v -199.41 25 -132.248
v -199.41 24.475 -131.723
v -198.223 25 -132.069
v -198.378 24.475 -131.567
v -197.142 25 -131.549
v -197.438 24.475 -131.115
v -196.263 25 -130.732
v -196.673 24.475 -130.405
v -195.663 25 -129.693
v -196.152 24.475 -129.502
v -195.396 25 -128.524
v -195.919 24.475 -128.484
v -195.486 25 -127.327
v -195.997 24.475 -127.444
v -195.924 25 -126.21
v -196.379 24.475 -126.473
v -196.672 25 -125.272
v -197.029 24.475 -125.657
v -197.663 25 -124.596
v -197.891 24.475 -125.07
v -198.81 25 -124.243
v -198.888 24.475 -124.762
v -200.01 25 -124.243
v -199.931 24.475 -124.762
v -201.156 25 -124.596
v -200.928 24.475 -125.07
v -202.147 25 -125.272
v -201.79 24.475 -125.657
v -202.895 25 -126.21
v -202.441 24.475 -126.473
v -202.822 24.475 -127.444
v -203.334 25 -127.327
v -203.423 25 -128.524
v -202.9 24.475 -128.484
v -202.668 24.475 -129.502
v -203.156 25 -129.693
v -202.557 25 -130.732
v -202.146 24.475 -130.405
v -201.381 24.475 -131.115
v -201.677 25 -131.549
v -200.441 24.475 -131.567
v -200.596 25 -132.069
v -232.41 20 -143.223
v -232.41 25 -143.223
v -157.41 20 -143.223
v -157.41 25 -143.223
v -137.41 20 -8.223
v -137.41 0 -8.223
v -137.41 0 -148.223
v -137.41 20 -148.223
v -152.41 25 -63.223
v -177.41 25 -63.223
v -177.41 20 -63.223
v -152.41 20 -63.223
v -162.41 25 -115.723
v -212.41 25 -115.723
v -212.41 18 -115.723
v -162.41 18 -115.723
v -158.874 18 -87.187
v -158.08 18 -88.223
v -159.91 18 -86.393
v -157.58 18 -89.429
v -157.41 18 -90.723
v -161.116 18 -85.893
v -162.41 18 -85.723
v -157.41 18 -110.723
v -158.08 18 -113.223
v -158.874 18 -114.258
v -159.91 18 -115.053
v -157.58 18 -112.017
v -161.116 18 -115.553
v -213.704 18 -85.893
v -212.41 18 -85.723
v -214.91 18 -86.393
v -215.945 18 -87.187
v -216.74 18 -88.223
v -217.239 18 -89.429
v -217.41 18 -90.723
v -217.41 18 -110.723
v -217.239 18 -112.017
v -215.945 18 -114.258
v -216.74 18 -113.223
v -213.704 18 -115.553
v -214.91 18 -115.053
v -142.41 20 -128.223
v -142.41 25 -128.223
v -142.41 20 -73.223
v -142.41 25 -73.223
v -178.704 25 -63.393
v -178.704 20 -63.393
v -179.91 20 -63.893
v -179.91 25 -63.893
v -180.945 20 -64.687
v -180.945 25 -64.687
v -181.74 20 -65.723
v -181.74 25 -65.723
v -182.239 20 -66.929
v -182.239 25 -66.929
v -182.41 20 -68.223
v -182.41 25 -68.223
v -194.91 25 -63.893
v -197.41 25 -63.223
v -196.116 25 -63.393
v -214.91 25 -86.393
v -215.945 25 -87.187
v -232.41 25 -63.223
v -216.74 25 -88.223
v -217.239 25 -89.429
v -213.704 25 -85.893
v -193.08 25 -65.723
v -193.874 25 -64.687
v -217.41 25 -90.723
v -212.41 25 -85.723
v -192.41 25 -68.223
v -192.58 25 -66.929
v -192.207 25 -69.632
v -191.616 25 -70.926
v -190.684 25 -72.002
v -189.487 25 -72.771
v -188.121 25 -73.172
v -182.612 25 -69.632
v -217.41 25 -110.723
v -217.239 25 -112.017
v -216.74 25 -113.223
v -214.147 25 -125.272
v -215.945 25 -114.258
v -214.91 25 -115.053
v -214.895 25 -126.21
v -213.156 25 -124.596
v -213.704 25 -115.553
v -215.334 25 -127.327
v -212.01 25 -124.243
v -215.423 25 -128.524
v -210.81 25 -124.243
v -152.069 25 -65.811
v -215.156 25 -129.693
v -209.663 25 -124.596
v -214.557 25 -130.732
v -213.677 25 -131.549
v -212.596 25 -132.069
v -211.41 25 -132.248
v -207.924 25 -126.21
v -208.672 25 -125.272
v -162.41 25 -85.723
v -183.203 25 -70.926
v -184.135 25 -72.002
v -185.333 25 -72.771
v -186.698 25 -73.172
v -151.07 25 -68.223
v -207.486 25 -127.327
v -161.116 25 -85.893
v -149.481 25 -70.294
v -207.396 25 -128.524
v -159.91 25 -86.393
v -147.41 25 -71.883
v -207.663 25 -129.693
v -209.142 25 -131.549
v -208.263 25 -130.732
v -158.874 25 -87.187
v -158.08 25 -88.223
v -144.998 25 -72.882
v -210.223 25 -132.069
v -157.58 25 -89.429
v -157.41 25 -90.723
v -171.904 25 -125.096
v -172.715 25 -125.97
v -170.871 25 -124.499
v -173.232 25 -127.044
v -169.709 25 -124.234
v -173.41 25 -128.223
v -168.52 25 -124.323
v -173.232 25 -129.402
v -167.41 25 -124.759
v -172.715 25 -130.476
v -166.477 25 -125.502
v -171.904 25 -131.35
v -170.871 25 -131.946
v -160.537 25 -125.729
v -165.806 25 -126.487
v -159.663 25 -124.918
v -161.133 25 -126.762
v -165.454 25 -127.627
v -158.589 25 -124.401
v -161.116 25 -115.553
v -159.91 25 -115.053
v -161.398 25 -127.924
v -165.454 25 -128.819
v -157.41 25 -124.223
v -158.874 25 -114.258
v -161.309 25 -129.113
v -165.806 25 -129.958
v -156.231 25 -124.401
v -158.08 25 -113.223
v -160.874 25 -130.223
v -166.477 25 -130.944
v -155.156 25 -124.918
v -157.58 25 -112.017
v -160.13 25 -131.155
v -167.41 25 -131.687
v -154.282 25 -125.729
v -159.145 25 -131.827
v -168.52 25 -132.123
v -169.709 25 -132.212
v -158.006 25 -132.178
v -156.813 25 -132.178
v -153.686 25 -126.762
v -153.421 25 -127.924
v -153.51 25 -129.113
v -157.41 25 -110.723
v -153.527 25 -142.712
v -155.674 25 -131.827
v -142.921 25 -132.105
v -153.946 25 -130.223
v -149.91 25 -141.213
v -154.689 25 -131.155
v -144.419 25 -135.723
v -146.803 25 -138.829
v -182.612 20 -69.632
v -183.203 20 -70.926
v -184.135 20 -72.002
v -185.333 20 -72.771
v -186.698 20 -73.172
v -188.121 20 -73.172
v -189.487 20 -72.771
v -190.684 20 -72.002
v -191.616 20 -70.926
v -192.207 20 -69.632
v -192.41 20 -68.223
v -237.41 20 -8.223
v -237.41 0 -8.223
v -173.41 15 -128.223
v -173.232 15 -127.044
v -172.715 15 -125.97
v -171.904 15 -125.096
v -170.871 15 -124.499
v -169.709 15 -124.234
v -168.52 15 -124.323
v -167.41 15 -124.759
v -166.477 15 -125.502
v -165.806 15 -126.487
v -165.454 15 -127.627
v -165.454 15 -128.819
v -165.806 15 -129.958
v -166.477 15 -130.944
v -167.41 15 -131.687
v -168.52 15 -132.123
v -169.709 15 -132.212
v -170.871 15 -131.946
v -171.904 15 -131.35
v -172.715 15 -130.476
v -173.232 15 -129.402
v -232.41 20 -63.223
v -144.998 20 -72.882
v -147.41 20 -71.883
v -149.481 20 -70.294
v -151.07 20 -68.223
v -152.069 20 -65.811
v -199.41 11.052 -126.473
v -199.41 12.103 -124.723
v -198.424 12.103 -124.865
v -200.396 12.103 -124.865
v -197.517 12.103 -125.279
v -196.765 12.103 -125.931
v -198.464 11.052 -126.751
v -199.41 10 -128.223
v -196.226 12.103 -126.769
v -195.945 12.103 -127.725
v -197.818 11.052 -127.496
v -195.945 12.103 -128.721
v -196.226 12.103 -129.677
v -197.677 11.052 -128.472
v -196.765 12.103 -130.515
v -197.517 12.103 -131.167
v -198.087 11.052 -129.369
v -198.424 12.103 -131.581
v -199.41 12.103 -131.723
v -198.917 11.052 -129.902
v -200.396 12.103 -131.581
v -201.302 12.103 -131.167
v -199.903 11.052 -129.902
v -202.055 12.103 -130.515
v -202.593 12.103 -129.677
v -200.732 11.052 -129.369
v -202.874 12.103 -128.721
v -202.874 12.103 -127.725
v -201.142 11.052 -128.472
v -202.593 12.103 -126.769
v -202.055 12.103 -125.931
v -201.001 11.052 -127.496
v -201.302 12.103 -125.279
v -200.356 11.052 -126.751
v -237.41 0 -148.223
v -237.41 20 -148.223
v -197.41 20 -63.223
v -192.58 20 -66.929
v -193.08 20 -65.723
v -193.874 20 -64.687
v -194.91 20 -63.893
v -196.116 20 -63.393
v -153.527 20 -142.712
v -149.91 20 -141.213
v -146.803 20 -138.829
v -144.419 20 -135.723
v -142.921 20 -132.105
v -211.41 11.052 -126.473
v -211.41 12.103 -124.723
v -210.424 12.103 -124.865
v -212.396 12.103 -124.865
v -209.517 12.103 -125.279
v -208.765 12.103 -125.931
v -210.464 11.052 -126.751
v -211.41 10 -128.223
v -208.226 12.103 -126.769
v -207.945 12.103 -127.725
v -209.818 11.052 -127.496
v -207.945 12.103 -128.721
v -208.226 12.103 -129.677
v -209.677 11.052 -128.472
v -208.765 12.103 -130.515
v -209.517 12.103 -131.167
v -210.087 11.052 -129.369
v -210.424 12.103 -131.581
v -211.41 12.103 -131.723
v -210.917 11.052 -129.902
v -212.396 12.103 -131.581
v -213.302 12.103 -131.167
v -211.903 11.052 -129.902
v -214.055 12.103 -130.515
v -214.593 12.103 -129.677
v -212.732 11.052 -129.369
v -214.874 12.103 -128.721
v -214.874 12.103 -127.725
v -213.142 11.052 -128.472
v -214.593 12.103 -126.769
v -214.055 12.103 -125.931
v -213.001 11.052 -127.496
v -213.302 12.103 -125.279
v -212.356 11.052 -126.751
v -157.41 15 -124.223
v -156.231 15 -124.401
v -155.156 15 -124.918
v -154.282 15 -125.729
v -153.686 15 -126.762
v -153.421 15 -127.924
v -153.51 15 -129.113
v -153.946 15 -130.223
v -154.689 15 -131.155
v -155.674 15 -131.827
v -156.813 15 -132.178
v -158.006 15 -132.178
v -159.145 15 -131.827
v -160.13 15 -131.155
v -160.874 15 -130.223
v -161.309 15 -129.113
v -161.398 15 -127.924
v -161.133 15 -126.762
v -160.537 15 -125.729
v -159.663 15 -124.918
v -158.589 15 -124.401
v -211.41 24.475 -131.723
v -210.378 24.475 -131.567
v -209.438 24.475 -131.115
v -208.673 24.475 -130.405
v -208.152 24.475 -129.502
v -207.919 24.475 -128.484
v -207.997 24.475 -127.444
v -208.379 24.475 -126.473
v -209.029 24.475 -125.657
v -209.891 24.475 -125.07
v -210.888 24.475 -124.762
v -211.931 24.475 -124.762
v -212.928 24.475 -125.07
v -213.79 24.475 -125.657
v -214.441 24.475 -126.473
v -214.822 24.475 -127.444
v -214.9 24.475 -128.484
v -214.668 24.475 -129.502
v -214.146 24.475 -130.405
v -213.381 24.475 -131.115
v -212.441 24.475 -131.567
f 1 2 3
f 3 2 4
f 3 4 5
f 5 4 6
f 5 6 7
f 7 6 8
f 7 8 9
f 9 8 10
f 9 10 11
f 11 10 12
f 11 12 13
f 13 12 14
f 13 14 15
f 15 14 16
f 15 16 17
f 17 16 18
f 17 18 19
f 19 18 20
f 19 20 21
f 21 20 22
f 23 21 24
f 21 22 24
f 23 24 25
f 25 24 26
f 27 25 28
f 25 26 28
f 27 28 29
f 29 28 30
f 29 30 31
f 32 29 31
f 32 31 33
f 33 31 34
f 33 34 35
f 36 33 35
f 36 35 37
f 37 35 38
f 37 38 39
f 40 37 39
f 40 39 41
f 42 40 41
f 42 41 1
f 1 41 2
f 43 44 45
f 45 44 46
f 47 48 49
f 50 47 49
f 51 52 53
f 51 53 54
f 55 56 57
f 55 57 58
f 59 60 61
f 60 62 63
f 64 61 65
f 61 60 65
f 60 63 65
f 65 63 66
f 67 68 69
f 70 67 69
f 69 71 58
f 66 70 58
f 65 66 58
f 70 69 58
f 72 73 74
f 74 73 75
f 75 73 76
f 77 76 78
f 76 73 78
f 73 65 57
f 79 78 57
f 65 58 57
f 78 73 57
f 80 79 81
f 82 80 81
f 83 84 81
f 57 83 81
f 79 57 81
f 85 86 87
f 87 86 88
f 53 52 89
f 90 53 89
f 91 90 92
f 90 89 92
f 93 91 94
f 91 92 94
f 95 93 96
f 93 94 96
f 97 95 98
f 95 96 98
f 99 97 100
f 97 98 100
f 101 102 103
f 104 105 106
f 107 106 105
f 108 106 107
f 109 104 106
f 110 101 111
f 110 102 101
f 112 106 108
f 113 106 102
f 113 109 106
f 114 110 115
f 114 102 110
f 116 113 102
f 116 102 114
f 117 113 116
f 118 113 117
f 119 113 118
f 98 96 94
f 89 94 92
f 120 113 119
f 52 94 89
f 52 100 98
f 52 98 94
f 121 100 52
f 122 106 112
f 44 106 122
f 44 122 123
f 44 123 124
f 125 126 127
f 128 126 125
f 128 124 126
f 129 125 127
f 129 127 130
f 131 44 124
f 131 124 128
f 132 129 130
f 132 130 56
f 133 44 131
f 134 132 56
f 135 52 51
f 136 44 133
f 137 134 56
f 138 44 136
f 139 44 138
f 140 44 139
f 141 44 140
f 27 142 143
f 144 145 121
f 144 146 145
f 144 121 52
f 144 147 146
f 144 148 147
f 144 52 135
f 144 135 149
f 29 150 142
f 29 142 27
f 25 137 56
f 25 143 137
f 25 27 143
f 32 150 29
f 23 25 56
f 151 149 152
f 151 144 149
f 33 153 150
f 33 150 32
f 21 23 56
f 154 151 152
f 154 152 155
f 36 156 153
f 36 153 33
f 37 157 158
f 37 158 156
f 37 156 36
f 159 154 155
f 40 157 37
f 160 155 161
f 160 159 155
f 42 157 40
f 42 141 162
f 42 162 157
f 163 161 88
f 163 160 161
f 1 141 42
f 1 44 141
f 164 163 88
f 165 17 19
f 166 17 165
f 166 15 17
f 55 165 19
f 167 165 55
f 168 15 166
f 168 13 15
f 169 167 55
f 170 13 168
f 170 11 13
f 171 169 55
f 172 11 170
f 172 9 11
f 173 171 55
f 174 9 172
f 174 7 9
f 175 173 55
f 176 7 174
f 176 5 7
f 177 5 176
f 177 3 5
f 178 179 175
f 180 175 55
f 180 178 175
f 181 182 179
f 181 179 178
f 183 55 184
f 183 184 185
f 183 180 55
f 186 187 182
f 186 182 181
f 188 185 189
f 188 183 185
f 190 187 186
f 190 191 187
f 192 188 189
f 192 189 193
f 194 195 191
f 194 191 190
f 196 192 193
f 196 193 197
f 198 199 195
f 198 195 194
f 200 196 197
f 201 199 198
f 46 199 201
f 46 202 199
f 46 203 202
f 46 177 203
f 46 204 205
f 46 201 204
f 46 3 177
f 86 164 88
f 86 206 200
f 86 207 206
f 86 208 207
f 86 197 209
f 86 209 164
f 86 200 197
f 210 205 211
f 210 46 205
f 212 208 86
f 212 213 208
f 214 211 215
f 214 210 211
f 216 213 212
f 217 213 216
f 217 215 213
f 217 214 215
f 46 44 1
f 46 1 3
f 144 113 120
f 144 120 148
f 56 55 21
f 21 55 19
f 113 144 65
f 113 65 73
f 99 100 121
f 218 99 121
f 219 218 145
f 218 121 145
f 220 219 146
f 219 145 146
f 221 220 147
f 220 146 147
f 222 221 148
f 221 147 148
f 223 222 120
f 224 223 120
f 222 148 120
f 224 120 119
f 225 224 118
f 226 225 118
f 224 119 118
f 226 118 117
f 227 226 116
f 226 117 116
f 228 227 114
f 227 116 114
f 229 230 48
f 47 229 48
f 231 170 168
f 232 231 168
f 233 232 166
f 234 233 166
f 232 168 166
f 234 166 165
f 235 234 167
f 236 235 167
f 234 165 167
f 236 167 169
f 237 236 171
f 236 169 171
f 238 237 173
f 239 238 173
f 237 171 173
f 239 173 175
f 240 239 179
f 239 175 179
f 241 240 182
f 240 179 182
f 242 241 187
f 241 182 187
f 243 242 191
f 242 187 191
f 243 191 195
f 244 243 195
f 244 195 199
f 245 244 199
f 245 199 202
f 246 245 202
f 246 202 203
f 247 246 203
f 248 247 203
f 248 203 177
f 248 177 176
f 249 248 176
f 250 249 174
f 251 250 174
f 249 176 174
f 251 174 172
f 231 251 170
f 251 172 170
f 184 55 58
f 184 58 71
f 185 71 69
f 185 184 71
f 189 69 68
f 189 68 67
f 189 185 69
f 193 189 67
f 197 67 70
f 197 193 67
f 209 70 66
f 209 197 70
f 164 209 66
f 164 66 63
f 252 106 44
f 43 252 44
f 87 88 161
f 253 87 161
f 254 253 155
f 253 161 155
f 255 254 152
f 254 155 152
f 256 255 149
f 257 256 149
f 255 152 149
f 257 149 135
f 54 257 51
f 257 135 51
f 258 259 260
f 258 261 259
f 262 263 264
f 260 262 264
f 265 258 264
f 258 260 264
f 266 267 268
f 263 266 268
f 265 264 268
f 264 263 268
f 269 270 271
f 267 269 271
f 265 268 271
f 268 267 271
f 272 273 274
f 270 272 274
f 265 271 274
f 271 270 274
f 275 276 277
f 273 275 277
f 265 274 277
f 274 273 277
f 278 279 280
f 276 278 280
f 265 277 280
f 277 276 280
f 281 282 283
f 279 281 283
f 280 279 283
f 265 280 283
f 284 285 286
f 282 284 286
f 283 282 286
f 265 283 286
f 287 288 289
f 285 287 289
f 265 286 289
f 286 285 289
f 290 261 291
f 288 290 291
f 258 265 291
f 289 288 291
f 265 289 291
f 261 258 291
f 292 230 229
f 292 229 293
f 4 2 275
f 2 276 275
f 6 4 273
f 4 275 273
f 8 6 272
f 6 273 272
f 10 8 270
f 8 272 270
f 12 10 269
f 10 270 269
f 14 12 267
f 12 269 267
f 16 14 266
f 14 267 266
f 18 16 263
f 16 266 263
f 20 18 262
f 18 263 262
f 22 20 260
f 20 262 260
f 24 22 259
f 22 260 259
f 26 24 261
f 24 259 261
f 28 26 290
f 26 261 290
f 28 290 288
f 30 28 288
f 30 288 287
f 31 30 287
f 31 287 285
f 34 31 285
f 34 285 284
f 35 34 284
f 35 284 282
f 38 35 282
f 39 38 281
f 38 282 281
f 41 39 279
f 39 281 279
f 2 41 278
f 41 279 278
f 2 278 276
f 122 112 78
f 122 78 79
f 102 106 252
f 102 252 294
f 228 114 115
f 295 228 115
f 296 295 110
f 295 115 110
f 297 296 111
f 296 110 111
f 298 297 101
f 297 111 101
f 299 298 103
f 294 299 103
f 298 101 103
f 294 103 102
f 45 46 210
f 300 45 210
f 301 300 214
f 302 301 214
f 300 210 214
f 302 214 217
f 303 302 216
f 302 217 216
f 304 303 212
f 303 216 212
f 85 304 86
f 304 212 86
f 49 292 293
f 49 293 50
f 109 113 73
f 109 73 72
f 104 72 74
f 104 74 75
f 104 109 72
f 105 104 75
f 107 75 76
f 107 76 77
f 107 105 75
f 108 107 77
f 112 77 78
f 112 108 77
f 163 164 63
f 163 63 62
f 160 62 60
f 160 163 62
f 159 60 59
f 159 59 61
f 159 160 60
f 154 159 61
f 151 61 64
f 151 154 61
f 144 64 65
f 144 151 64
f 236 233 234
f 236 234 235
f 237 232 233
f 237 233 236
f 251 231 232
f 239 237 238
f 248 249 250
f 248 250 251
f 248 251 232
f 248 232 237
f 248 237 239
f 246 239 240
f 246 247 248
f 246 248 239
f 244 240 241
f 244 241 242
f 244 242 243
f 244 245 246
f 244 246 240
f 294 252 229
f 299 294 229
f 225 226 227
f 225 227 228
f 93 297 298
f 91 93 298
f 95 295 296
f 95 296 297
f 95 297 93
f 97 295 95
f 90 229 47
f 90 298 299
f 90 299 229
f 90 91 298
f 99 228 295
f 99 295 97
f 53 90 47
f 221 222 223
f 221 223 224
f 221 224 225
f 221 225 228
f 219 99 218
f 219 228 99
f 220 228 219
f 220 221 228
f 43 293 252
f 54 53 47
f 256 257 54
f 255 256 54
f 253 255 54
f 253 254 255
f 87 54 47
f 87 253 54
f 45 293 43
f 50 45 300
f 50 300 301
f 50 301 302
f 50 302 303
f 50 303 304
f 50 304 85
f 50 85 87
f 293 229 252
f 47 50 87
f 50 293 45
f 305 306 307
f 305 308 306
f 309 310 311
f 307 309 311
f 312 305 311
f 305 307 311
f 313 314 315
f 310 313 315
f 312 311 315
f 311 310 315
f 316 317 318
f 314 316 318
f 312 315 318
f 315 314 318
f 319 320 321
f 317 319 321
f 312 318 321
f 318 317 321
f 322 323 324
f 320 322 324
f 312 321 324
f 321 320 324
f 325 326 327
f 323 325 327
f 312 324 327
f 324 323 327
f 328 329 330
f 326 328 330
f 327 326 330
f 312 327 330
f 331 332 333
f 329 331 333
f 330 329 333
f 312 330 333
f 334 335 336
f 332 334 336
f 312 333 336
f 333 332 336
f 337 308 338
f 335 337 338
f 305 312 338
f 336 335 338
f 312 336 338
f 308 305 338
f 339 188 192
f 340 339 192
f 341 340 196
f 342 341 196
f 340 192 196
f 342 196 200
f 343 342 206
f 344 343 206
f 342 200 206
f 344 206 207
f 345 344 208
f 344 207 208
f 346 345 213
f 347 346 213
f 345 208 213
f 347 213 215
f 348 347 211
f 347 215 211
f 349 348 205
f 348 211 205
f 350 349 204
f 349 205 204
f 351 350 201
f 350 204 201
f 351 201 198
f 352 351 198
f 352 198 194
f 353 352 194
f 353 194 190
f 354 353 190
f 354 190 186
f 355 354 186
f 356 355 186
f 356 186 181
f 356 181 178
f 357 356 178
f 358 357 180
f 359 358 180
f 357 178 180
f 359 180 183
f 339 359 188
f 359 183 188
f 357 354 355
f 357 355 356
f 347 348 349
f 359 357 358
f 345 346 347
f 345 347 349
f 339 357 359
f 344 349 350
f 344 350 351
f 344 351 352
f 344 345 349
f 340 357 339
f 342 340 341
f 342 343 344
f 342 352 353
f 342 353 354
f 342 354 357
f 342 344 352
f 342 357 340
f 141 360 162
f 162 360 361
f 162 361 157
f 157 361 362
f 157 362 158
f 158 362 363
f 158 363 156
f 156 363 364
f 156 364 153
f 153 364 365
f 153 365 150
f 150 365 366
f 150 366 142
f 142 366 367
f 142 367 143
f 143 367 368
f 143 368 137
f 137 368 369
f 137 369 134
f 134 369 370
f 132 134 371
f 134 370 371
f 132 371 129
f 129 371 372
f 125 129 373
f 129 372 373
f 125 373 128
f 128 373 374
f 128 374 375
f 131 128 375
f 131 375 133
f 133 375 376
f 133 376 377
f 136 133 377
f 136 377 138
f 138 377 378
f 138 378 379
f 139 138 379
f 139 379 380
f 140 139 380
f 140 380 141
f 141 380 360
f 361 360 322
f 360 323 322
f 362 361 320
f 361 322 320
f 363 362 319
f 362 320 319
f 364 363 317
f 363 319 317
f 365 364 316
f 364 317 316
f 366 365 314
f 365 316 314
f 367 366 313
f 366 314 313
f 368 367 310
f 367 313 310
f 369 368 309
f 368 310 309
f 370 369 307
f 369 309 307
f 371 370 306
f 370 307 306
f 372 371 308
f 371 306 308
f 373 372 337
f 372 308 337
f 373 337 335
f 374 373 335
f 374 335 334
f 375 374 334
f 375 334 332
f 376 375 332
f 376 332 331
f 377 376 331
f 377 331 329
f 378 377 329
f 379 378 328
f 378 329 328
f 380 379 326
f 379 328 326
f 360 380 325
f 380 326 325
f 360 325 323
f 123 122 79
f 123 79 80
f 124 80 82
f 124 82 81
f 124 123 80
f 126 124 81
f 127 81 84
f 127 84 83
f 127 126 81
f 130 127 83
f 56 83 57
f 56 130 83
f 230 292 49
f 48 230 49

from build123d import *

# Parameters (mm, degrees)
SKETCH1_W                       = 100
SKETCH1_H                       = 140
BOSS_EXTRUDE1_DEPTH             = 25
SKETCH2_W                       = 100
SKETCH2_H                       = 55
CUT_EXTRUDE1_DEPTH              = 5
CUT_EXTRUDE2_DEPTH              = 5
SKETCH5_R                       = 4
CUT_EXTRUDE3_DEPTH              = 10
M8X1_0_TAPPED_HOLE1_D           = 7
M8X1_0_TAPPED_HOLE1_DEPTH       = 12.896987833
M8X1_0_TAPPED_HOLE1_CSINK_D     = 8.05
M8X1_0_TAPPED_HOLE1_CSINK_ANGLE = 90
M8X1_0_TAPPED_HOLE1_TIP         = 2.103012167
CUT_EXTRUDE4_DEPTH              = 7


with BuildPart() as part:
    # Sketch1 → Boss-Extrude1 (new body)
    with BuildSketch(Plane(origin=(0, 0, 0), x_dir=(1, 0, 0), z_dir=(0, 1, 0))):
        with Locations((-187.409638554, 78.222891566)):
            Rectangle(SKETCH1_W, SKETCH1_H)
    extrude(amount=BOSS_EXTRUDE1_DEPTH)

    # Sketch2 → Cut-Extrude1 (cut)
    with BuildSketch(Plane(origin=(0, 25, 0), x_dir=(1, 0, 0), z_dir=(0, 1, 0))):
        with Locations((-187.409638554, 35.722891566)):
            Rectangle(SKETCH2_W, SKETCH2_H)
    extrude(amount=-CUT_EXTRUDE1_DEPTH, mode=Mode.SUBTRACT)

    # Sketch3 → Cut-Extrude2 (cut)
    with BuildSketch(Plane(origin=(0, 25, 0), x_dir=(1, 0, 0), z_dir=(0, 1, 0))):
        with BuildLine():
            Line((-237.409638554, 148.222891566), (-237.409638554, 63.222891566))
            Line((-237.409638554, 63.222891566), (-232.409638554, 63.222891566))
            Line((-232.409638554, 63.222891566), (-232.409638554, 143.222891566))
            Line((-232.409638554, 143.222891566), (-157.409638554, 143.222891566))
            ThreePointArc((-157.409638554, 143.222891566), (-146.803036836, 138.829493284), (-142.409638554, 128.222891566))
            Line((-142.409638554, 128.222891566), (-142.409638554, 73.222891566))
            ThreePointArc((-142.409638554, 73.222891566), (-149.480706366, 70.293959378), (-152.409638554, 63.222891566))
            Line((-152.409638554, 63.222891566), (-137.409638554, 63.222891566))
            Line((-137.409638554, 63.222891566), (-137.409638554, 148.222891566))
            Line((-137.409638554, 148.222891566), (-237.409638554, 148.222891566))
        make_face()
        with BuildLine():
            ThreePointArc((-192.409638554, 68.222891566), (-193.874104648, 64.68735766), (-197.409638554, 63.222891566))
            Line((-197.409638554, 63.222891566), (-177.409638554, 63.222891566))
            ThreePointArc((-177.409638554, 63.222891566), (-180.94517246, 64.68735766), (-182.409638554, 68.222891566))
            ThreePointArc((-182.409638554, 68.222891566), (-187.409638554, 73.222891566), (-192.409638554, 68.222891566))
        make_face()
    extrude(amount=-CUT_EXTRUDE2_DEPTH, mode=Mode.SUBTRACT)

    # Sketch5 → Cut-Extrude3 (cut)
    with BuildSketch(Plane(origin=(0, 25, 0), x_dir=(1, 0, 0), z_dir=(0, 1, 0))):
        with BuildLine():
            ThreePointArc((-165.409638554, 128.222891566), (-169.409638554, 132.222891566), (-173.409638554, 128.222891566))
            Line((-173.409638554, 128.222891566), (-169.409638554, 128.222891566))
            Line((-169.409638554, 128.222891566), (-165.409638554, 128.222891566))
        make_face()
        with BuildLine():
            Line((-169.409638554, 128.222891566), (-173.409638554, 128.222891566))
            ThreePointArc((-173.409638554, 128.222891566), (-169.409638554, 124.222891566), (-165.409638554, 128.222891566))
            Line((-165.409638554, 128.222891566), (-169.409638554, 128.222891566))
        make_face()
        with Locations(Location((-157.409638554, 128.222891566, 0), (0, 0, 270))):
            Circle(SKETCH5_R)
    extrude(amount=-CUT_EXTRUDE3_DEPTH, mode=Mode.SUBTRACT)

    # M8x1.0 Tapped Hole1
    with Locations(Plane(origin=(-211.409638554, 25, -128.222891566), x_dir=(0, 0, 1), z_dir=(0, 1, 0))):
        with Locations((0, 0), (0, 12)):
            CounterSinkHole(M8X1_0_TAPPED_HOLE1_D / 2, M8X1_0_TAPPED_HOLE1_CSINK_D / 2, depth=M8X1_0_TAPPED_HOLE1_DEPTH, counter_sink_angle=M8X1_0_TAPPED_HOLE1_CSINK_ANGLE)
            with Locations((0, 0, -(M8X1_0_TAPPED_HOLE1_DEPTH + M8X1_0_TAPPED_HOLE1_TIP / 2))):  # 118° drill point
                Cone(0, M8X1_0_TAPPED_HOLE1_D / 2, M8X1_0_TAPPED_HOLE1_TIP, mode=Mode.SUBTRACT)

    # Sketch13 → Cut-Extrude4 (cut)
    with BuildSketch(Plane(origin=(0, 25, 0), x_dir=(1, 0, 0), z_dir=(0, 1, 0))):
        with BuildLine():
            Line((-162.409638554, 85.722891566), (-212.409638554, 85.722891566))
            ThreePointArc((-212.409638554, 85.722891566), (-215.94517246, 87.18735766), (-217.409638554, 90.722891566))
            Line((-217.409638554, 90.722891566), (-217.409638554, 110.722891566))
            ThreePointArc((-217.409638554, 110.722891566), (-215.94517246, 114.258425472), (-212.409638554, 115.722891566))
            Line((-212.409638554, 115.722891566), (-162.409638554, 115.722891566))
            ThreePointArc((-162.409638554, 115.722891566), (-158.874104648, 114.258425472), (-157.409638554, 110.722891566))
            Line((-157.409638554, 110.722891566), (-157.409638554, 90.722891566))
            ThreePointArc((-157.409638554, 90.722891566), (-158.874104648, 87.18735766), (-162.409638554, 85.722891566))
        make_face()
    extrude(amount=-CUT_EXTRUDE4_DEPTH, mode=Mode.SUBTRACT)


solid = part.part
